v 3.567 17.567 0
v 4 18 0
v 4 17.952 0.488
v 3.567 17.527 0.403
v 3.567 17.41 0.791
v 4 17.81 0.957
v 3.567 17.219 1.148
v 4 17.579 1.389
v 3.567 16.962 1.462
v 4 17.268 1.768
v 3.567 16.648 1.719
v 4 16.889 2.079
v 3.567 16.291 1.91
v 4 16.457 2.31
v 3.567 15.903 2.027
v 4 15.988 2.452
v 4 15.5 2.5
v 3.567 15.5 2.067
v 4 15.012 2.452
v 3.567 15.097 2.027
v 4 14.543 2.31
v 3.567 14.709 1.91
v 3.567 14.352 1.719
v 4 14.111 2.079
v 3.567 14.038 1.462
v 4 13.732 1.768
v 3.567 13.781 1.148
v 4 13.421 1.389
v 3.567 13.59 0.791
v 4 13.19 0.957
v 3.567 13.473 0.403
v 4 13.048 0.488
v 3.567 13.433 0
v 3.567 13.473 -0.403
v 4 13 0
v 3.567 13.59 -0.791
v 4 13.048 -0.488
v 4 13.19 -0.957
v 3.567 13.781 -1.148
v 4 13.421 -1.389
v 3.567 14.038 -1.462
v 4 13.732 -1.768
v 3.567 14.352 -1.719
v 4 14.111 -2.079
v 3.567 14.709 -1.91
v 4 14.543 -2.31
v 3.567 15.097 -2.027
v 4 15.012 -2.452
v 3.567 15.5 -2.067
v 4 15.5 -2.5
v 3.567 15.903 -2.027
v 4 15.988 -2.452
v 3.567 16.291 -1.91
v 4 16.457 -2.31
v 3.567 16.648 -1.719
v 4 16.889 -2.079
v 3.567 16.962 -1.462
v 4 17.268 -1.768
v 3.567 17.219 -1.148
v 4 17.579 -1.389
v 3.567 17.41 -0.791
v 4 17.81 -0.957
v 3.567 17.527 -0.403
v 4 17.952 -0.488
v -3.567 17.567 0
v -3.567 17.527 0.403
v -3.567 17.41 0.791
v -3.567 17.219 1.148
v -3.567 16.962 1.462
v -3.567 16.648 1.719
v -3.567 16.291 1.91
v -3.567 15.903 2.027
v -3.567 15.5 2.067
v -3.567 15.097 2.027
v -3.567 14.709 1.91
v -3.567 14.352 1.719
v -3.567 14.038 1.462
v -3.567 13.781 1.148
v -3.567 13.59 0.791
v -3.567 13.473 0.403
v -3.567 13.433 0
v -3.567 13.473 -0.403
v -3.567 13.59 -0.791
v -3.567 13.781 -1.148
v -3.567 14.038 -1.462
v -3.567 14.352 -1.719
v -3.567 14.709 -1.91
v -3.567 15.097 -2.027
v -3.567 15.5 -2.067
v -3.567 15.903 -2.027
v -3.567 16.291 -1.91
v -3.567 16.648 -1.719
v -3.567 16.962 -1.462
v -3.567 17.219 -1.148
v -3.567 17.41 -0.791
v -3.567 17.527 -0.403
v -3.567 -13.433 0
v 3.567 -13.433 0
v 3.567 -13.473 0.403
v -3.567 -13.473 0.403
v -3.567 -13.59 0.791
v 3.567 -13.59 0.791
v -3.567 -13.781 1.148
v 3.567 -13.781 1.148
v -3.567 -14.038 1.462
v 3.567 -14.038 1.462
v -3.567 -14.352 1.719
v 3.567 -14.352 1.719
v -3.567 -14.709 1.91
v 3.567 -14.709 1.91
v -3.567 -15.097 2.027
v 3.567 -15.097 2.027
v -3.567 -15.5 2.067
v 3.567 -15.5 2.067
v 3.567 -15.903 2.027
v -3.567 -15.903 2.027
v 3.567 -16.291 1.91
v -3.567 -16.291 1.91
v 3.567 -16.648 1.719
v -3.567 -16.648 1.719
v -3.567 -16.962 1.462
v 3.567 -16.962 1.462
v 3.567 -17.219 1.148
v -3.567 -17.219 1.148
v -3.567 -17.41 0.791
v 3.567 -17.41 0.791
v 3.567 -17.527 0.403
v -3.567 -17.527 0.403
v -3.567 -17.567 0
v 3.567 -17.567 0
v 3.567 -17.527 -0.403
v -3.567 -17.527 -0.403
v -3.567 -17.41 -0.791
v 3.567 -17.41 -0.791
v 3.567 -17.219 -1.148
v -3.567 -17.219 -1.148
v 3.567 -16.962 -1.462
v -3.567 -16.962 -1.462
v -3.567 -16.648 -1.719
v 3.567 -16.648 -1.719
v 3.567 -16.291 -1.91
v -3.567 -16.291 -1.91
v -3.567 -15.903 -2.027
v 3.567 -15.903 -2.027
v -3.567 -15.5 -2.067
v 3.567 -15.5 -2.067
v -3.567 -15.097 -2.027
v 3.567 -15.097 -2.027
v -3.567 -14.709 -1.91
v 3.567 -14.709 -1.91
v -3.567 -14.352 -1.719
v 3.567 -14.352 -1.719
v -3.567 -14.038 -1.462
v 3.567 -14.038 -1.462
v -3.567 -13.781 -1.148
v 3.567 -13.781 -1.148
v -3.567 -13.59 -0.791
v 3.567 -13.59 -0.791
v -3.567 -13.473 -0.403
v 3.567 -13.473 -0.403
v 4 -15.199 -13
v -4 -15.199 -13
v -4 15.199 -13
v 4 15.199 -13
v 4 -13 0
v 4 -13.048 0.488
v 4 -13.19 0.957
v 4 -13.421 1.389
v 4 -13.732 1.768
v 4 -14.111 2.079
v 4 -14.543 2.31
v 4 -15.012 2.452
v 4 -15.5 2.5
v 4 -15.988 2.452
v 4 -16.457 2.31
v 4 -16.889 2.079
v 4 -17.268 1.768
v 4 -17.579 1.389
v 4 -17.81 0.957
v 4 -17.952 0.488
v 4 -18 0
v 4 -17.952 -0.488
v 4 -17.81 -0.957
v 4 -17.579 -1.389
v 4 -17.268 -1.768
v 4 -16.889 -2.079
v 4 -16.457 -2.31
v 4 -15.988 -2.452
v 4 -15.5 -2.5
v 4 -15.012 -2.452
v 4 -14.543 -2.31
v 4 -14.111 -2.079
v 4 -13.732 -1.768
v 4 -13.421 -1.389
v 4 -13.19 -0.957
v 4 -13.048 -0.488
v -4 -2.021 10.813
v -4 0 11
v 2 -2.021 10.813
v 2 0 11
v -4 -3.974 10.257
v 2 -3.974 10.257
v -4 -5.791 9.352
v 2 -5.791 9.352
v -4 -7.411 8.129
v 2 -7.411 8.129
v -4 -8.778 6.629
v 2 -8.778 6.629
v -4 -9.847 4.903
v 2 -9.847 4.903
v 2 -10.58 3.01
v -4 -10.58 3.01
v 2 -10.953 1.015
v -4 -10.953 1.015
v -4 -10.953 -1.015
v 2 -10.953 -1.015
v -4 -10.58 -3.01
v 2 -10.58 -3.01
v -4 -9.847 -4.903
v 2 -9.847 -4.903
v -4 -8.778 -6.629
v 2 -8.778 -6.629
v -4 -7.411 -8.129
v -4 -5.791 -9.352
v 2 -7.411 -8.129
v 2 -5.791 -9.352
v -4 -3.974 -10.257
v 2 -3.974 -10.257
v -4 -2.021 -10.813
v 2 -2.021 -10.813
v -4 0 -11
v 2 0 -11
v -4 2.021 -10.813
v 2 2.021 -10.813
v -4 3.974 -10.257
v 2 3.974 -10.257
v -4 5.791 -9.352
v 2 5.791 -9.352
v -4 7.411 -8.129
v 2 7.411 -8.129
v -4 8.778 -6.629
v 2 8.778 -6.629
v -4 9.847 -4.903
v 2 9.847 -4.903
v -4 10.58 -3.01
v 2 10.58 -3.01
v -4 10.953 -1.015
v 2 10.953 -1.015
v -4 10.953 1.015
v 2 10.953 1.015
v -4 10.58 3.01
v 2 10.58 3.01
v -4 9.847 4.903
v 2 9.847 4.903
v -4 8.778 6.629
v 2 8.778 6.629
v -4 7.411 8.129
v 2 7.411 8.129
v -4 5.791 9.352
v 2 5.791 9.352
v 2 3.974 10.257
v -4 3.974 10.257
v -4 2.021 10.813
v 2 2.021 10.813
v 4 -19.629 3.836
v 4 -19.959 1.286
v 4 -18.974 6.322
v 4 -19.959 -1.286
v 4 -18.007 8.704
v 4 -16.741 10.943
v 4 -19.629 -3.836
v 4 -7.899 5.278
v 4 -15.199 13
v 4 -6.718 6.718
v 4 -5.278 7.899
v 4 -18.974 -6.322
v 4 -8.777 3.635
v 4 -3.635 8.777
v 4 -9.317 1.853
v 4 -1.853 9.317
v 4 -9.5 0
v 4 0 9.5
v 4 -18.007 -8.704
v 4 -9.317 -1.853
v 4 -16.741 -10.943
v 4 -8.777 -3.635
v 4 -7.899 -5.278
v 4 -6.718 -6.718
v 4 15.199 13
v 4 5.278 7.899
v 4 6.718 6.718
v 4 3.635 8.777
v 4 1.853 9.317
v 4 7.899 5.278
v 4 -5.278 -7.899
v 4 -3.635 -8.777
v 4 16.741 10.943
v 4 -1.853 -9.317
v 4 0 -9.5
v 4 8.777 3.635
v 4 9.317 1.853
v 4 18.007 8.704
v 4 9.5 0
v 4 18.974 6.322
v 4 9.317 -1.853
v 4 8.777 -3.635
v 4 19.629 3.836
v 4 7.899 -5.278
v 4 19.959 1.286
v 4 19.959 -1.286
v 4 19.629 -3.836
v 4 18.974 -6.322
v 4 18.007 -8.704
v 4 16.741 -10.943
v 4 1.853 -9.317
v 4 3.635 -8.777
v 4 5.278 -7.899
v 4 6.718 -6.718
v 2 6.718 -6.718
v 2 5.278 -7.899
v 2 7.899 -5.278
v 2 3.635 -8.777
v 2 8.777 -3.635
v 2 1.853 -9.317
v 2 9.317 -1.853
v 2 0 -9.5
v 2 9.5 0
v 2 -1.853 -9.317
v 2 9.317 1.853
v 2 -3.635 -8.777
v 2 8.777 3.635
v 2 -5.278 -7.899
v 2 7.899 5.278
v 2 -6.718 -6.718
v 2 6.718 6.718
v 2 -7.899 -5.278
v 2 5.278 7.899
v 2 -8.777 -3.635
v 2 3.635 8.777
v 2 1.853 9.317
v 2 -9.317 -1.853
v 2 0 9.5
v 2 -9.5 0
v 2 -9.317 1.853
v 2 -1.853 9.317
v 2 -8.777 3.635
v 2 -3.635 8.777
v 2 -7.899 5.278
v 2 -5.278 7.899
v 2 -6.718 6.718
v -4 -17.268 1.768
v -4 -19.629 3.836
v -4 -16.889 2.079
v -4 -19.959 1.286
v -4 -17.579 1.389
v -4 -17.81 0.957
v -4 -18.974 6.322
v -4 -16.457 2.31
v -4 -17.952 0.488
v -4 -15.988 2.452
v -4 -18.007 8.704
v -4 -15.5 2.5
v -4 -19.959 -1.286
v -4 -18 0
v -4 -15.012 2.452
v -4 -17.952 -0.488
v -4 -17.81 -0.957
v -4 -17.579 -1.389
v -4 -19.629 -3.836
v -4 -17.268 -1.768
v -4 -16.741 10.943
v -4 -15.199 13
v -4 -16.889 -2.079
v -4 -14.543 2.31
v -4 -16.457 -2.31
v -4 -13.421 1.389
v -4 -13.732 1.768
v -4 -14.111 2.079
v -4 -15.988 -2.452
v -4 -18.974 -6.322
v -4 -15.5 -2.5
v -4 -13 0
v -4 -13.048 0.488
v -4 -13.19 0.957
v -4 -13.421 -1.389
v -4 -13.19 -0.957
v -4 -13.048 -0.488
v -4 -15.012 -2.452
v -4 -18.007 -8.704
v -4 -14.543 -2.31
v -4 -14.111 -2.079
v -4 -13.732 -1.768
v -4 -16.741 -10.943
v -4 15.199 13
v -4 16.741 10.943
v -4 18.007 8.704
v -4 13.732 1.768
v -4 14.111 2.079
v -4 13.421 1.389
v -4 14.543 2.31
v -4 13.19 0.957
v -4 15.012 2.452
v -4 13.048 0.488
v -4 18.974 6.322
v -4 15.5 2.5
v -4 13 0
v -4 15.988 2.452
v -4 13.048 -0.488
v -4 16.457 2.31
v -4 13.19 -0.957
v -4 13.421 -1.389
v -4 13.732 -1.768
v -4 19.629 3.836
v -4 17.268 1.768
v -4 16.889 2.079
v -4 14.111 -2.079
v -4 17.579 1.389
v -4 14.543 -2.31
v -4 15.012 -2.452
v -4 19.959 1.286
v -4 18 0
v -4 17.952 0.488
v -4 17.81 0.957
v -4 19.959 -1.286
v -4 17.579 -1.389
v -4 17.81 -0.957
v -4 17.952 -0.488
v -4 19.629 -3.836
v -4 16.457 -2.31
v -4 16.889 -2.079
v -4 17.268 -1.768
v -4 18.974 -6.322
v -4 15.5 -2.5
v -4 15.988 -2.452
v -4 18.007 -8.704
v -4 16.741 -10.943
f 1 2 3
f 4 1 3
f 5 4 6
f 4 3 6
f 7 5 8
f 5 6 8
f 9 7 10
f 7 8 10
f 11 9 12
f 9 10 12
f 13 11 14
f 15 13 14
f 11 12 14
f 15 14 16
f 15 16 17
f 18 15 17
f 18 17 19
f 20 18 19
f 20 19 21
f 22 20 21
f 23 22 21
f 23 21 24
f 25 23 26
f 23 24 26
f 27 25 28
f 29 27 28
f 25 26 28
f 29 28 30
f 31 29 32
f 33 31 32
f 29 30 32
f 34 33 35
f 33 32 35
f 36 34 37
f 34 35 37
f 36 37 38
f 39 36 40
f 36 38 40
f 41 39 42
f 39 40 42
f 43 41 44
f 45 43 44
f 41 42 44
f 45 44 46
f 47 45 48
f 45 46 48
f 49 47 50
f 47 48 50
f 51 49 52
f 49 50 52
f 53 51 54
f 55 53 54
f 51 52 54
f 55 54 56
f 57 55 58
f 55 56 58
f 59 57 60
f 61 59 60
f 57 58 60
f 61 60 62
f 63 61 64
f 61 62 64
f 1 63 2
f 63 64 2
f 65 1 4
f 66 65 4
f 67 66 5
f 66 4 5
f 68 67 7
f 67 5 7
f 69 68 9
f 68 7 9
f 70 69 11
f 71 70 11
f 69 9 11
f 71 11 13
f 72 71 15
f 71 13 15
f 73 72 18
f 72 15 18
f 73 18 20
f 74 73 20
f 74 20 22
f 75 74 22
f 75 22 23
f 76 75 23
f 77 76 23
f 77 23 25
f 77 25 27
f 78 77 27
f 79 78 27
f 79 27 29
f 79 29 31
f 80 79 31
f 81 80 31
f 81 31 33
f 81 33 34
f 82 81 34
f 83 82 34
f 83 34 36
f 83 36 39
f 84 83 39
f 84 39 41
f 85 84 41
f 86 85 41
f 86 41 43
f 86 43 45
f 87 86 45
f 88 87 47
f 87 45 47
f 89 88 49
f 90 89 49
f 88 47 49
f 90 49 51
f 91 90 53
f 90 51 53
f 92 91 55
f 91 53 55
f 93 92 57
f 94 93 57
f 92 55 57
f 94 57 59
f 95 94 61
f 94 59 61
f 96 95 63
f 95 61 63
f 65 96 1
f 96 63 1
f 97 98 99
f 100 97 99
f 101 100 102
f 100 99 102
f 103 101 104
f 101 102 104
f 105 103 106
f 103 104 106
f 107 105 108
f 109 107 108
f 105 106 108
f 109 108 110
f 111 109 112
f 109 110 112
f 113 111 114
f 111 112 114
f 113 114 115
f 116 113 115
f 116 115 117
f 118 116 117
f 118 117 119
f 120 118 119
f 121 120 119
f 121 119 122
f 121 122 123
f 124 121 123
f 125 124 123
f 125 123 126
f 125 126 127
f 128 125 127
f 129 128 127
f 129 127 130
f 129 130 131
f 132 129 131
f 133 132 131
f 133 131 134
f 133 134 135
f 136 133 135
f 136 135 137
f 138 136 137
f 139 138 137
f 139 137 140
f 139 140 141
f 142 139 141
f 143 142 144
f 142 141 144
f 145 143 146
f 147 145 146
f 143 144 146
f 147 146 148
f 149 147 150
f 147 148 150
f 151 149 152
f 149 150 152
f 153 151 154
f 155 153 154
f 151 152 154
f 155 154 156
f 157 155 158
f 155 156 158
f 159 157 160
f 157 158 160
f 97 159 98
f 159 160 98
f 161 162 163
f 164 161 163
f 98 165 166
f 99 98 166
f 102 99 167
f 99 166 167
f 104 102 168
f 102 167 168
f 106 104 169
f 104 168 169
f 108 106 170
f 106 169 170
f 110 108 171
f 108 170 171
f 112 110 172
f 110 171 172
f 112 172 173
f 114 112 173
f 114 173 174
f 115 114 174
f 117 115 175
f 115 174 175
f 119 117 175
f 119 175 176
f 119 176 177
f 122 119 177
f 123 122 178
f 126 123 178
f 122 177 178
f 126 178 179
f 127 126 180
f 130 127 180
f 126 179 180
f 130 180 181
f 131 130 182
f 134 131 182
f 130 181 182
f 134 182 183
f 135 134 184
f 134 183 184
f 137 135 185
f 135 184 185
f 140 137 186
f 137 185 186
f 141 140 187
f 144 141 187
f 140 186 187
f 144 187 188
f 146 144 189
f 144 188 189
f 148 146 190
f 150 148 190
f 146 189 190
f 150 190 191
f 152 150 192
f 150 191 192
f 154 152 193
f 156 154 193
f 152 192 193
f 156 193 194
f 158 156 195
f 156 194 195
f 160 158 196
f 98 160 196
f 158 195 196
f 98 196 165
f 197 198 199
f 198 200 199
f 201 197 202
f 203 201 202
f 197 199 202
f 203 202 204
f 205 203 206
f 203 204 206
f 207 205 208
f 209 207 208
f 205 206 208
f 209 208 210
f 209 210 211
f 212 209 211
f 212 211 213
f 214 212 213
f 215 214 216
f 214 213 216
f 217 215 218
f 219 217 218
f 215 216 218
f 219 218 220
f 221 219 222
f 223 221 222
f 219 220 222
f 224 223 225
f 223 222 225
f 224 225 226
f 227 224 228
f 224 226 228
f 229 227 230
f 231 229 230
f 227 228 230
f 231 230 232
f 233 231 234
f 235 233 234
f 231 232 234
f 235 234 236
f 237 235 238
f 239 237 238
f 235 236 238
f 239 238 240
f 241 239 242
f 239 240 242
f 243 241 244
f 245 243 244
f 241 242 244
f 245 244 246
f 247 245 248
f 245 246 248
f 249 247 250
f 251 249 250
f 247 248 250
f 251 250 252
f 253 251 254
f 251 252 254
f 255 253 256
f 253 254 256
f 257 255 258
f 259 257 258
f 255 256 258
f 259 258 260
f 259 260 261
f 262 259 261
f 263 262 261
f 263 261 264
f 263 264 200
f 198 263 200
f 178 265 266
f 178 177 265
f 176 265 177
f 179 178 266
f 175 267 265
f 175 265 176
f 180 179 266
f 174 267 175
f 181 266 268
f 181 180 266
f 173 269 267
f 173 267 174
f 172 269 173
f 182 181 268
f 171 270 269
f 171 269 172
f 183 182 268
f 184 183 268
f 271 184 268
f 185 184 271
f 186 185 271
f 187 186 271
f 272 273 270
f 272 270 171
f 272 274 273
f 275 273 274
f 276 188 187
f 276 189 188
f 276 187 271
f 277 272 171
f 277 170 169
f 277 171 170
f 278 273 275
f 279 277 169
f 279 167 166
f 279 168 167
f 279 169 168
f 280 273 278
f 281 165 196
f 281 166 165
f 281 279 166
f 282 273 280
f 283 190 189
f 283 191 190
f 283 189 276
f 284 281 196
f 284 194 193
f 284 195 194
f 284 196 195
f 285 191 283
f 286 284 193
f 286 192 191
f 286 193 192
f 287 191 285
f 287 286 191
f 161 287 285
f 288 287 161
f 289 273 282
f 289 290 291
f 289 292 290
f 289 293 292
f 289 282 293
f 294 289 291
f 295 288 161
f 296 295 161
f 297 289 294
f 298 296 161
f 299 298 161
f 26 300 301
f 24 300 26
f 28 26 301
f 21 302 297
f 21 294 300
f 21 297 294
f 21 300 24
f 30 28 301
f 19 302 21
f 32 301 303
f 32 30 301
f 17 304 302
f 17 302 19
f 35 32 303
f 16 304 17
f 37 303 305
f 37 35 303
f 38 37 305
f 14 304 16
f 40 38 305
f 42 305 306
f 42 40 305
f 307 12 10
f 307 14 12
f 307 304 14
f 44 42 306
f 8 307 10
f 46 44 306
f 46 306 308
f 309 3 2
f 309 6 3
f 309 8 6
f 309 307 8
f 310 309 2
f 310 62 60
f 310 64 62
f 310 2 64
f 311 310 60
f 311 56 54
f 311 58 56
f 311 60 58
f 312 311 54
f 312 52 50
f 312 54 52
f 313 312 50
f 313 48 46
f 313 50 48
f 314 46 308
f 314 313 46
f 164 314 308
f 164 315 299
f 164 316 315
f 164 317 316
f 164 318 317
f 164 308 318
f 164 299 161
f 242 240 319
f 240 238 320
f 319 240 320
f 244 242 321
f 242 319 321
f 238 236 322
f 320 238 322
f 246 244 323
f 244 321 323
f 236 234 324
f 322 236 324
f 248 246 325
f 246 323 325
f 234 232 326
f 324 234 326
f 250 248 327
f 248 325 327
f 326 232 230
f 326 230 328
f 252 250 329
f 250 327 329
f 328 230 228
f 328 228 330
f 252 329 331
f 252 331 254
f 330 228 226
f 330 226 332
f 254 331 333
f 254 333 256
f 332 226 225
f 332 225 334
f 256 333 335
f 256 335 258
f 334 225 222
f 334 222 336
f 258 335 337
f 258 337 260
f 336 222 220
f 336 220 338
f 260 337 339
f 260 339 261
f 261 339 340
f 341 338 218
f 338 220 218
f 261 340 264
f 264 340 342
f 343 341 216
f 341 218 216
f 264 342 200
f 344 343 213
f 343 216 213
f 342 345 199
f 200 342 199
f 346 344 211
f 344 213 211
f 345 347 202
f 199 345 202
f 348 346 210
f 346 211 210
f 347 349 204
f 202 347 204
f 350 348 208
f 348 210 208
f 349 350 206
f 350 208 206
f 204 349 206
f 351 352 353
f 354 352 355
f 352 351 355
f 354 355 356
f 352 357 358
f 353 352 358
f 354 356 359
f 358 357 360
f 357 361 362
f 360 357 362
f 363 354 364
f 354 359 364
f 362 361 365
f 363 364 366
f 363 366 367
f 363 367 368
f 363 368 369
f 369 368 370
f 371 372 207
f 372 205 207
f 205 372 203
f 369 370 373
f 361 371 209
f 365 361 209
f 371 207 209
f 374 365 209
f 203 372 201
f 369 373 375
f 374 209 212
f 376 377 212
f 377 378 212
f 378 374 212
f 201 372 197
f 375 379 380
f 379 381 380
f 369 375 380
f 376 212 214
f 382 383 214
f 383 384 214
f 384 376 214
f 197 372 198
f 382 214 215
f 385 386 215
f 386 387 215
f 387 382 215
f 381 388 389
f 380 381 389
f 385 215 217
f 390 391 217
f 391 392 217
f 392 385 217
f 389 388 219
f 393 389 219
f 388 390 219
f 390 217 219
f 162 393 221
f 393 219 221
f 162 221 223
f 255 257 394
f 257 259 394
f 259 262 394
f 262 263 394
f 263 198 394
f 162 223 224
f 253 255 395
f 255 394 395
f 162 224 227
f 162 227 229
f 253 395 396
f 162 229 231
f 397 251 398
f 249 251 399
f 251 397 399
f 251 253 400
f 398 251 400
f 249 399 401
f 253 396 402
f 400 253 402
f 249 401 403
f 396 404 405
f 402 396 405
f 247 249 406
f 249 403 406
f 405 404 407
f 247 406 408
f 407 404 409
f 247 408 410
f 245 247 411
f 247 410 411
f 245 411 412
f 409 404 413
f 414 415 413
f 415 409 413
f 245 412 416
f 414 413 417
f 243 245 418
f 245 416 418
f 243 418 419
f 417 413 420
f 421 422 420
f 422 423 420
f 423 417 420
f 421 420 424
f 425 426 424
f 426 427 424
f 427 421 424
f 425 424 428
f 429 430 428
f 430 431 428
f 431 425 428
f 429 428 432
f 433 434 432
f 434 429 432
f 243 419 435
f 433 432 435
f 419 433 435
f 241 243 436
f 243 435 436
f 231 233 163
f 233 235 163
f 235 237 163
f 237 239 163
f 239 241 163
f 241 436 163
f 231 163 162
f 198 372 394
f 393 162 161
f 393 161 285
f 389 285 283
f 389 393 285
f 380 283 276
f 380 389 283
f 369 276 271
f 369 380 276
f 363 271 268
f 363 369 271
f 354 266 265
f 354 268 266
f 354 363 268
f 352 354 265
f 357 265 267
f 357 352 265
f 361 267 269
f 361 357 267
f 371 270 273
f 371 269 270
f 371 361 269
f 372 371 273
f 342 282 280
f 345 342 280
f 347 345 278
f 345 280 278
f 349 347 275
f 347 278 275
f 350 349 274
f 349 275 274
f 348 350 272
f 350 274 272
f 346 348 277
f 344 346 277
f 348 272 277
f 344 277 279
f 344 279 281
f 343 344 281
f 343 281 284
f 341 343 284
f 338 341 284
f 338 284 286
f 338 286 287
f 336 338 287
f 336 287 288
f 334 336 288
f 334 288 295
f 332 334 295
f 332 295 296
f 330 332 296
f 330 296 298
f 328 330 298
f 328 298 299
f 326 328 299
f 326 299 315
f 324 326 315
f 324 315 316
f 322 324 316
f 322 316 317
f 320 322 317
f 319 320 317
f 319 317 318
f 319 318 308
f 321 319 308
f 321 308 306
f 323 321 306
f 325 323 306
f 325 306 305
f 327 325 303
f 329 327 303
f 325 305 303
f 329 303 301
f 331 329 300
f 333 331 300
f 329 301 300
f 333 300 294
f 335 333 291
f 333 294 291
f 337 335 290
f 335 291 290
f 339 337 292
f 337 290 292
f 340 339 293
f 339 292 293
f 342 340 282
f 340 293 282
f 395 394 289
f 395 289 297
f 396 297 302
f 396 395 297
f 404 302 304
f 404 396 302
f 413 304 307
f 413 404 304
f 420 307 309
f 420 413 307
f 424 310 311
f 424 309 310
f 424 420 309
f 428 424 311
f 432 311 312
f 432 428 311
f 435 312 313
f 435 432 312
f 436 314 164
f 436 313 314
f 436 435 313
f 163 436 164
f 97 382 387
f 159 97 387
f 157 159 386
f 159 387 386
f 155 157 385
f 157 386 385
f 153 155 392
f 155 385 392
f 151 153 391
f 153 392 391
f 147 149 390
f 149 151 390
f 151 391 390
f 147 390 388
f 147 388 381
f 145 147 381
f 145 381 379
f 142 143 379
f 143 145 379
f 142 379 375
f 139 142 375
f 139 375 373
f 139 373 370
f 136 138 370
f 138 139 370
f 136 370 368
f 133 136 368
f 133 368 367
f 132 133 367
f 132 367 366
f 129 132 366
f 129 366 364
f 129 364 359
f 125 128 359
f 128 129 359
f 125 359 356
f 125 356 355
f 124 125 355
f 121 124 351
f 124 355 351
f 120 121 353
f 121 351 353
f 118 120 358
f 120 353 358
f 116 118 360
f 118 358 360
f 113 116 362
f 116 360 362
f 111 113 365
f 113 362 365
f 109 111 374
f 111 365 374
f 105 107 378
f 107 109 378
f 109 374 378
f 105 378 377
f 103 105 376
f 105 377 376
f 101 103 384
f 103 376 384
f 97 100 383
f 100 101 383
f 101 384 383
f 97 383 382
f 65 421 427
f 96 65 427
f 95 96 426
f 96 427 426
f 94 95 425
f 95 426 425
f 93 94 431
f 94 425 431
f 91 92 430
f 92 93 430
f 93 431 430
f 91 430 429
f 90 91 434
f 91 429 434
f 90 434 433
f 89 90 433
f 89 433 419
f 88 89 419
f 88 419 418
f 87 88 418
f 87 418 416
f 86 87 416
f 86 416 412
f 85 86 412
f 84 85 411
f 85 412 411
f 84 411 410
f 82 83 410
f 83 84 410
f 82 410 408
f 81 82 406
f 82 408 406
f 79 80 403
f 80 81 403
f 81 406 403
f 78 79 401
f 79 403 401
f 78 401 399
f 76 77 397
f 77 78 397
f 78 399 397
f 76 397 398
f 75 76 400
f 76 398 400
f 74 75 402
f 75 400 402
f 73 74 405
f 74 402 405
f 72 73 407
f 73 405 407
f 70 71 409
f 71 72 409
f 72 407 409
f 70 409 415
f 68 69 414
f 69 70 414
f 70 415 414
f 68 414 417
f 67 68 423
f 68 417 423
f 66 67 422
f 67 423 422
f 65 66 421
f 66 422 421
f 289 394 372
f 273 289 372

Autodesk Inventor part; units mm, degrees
sketch "Sketch_1" plane through (0, 0, 0) normal (1, 0, 0) x (0, 0, -1)
  line L0 (-13, 15.1987) -> (-13, -15.1987)
  arc A0 (-13, -15.1987) -> (13, -15.1987) centre (0, 0) ccw
  line L1 (13, -15.1987) -> (13, 15.1987)
  arc A1 (13, 15.1987) -> (-13, 15.1987) centre (0, 0) ccw
extrude "Extrusion1" add sketch "Sketch_1" along normal mid plane 8
sketch "Sketch2" plane through (-4, 0, 0) normal (-1, 0, 0) x (0, 0, 1)
  point P0 (0, 0)
hole "Hole1" at (-4, 0, 0) direction (1, 0, 0) diameter 19 depth 8 counterbore diameter 22 counterbore depth 6
sketch "Sketch_11" plane through (0, 0, 0) normal (0, 0, 1) x (1, 0, 0)
  line L0 (4, -15.5) -> (-4, -15.5)
  line L1 (-4, -15.5) -> (-4, -13)
  line L2 (-4, -13) -> (-3.567, -13.433)
  line L3 (-3.567, -13.433) -> (3.567, -13.433)
  line L4 (3.567, -13.433) -> (4, -13)
  line L5 (4, -13) -> (4, -15.5)
  line L6 (4, -15.5) -> (-4, -15.5)
revolve "Revolution1" cut sketch "Sketch_11" angle 360 about axis through (4, -15.5, 0) along (1, 0, 0)
thread "Thread1" size "M5x0.8" class "6H" standard "ISO Metric profile" full length
sketch "Sketch_9" plane through (0, 0, 0) normal (0, 0, 1) x (1, 0, 0)
  line L0 (4, 15.5) -> (-4, 15.5)
  line L1 (-4, 15.5) -> (-4, 18)
  line L2 (-4, 18) -> (-3.567, 17.567)
  line L3 (-3.567, 17.567) -> (3.567, 17.567)
  line L4 (3.567, 17.567) -> (4, 18)
  line L5 (4, 18) -> (4, 15.5)
  line L6 (4, 15.5) -> (-4, 15.5)
revolve "Revolution2" cut sketch "Sketch_9" angle 360 about axis through (4, 15.5, 0) along (1, 0, 0)
thread "Thread2" size "M5x0.8" class "6H" standard "ISO Metric profile" full length
ref_plane "housing_to_dummy_XY" through (0, 0, 0) normal (0, 0, 1) x (1, 0, 0)
ref_plane "housing_to_dummy_YZ" through (0, 0, 0) normal (1, 0, 0) x (0, 1, 0)
ref_plane "housing_to_dummy_ZX" through (0, 0, 0) normal (0, 1, 0) x (0, 0, 1)
ref_plane "to_bearings_XY" through (-4, 0, 0) normal (-1, 0, 0) x (0, 0, -1)
ref_plane "to_bearings_YZ" through (-4, 0, 0) normal (0, 0, -1) x (0, -1, 0)
ref_plane "to_bearings_ZX" through (-4, 0, 0) normal (0, -1, 0) x (-1, 0, 0)
properties part number "SBGTN6900VV_h"
